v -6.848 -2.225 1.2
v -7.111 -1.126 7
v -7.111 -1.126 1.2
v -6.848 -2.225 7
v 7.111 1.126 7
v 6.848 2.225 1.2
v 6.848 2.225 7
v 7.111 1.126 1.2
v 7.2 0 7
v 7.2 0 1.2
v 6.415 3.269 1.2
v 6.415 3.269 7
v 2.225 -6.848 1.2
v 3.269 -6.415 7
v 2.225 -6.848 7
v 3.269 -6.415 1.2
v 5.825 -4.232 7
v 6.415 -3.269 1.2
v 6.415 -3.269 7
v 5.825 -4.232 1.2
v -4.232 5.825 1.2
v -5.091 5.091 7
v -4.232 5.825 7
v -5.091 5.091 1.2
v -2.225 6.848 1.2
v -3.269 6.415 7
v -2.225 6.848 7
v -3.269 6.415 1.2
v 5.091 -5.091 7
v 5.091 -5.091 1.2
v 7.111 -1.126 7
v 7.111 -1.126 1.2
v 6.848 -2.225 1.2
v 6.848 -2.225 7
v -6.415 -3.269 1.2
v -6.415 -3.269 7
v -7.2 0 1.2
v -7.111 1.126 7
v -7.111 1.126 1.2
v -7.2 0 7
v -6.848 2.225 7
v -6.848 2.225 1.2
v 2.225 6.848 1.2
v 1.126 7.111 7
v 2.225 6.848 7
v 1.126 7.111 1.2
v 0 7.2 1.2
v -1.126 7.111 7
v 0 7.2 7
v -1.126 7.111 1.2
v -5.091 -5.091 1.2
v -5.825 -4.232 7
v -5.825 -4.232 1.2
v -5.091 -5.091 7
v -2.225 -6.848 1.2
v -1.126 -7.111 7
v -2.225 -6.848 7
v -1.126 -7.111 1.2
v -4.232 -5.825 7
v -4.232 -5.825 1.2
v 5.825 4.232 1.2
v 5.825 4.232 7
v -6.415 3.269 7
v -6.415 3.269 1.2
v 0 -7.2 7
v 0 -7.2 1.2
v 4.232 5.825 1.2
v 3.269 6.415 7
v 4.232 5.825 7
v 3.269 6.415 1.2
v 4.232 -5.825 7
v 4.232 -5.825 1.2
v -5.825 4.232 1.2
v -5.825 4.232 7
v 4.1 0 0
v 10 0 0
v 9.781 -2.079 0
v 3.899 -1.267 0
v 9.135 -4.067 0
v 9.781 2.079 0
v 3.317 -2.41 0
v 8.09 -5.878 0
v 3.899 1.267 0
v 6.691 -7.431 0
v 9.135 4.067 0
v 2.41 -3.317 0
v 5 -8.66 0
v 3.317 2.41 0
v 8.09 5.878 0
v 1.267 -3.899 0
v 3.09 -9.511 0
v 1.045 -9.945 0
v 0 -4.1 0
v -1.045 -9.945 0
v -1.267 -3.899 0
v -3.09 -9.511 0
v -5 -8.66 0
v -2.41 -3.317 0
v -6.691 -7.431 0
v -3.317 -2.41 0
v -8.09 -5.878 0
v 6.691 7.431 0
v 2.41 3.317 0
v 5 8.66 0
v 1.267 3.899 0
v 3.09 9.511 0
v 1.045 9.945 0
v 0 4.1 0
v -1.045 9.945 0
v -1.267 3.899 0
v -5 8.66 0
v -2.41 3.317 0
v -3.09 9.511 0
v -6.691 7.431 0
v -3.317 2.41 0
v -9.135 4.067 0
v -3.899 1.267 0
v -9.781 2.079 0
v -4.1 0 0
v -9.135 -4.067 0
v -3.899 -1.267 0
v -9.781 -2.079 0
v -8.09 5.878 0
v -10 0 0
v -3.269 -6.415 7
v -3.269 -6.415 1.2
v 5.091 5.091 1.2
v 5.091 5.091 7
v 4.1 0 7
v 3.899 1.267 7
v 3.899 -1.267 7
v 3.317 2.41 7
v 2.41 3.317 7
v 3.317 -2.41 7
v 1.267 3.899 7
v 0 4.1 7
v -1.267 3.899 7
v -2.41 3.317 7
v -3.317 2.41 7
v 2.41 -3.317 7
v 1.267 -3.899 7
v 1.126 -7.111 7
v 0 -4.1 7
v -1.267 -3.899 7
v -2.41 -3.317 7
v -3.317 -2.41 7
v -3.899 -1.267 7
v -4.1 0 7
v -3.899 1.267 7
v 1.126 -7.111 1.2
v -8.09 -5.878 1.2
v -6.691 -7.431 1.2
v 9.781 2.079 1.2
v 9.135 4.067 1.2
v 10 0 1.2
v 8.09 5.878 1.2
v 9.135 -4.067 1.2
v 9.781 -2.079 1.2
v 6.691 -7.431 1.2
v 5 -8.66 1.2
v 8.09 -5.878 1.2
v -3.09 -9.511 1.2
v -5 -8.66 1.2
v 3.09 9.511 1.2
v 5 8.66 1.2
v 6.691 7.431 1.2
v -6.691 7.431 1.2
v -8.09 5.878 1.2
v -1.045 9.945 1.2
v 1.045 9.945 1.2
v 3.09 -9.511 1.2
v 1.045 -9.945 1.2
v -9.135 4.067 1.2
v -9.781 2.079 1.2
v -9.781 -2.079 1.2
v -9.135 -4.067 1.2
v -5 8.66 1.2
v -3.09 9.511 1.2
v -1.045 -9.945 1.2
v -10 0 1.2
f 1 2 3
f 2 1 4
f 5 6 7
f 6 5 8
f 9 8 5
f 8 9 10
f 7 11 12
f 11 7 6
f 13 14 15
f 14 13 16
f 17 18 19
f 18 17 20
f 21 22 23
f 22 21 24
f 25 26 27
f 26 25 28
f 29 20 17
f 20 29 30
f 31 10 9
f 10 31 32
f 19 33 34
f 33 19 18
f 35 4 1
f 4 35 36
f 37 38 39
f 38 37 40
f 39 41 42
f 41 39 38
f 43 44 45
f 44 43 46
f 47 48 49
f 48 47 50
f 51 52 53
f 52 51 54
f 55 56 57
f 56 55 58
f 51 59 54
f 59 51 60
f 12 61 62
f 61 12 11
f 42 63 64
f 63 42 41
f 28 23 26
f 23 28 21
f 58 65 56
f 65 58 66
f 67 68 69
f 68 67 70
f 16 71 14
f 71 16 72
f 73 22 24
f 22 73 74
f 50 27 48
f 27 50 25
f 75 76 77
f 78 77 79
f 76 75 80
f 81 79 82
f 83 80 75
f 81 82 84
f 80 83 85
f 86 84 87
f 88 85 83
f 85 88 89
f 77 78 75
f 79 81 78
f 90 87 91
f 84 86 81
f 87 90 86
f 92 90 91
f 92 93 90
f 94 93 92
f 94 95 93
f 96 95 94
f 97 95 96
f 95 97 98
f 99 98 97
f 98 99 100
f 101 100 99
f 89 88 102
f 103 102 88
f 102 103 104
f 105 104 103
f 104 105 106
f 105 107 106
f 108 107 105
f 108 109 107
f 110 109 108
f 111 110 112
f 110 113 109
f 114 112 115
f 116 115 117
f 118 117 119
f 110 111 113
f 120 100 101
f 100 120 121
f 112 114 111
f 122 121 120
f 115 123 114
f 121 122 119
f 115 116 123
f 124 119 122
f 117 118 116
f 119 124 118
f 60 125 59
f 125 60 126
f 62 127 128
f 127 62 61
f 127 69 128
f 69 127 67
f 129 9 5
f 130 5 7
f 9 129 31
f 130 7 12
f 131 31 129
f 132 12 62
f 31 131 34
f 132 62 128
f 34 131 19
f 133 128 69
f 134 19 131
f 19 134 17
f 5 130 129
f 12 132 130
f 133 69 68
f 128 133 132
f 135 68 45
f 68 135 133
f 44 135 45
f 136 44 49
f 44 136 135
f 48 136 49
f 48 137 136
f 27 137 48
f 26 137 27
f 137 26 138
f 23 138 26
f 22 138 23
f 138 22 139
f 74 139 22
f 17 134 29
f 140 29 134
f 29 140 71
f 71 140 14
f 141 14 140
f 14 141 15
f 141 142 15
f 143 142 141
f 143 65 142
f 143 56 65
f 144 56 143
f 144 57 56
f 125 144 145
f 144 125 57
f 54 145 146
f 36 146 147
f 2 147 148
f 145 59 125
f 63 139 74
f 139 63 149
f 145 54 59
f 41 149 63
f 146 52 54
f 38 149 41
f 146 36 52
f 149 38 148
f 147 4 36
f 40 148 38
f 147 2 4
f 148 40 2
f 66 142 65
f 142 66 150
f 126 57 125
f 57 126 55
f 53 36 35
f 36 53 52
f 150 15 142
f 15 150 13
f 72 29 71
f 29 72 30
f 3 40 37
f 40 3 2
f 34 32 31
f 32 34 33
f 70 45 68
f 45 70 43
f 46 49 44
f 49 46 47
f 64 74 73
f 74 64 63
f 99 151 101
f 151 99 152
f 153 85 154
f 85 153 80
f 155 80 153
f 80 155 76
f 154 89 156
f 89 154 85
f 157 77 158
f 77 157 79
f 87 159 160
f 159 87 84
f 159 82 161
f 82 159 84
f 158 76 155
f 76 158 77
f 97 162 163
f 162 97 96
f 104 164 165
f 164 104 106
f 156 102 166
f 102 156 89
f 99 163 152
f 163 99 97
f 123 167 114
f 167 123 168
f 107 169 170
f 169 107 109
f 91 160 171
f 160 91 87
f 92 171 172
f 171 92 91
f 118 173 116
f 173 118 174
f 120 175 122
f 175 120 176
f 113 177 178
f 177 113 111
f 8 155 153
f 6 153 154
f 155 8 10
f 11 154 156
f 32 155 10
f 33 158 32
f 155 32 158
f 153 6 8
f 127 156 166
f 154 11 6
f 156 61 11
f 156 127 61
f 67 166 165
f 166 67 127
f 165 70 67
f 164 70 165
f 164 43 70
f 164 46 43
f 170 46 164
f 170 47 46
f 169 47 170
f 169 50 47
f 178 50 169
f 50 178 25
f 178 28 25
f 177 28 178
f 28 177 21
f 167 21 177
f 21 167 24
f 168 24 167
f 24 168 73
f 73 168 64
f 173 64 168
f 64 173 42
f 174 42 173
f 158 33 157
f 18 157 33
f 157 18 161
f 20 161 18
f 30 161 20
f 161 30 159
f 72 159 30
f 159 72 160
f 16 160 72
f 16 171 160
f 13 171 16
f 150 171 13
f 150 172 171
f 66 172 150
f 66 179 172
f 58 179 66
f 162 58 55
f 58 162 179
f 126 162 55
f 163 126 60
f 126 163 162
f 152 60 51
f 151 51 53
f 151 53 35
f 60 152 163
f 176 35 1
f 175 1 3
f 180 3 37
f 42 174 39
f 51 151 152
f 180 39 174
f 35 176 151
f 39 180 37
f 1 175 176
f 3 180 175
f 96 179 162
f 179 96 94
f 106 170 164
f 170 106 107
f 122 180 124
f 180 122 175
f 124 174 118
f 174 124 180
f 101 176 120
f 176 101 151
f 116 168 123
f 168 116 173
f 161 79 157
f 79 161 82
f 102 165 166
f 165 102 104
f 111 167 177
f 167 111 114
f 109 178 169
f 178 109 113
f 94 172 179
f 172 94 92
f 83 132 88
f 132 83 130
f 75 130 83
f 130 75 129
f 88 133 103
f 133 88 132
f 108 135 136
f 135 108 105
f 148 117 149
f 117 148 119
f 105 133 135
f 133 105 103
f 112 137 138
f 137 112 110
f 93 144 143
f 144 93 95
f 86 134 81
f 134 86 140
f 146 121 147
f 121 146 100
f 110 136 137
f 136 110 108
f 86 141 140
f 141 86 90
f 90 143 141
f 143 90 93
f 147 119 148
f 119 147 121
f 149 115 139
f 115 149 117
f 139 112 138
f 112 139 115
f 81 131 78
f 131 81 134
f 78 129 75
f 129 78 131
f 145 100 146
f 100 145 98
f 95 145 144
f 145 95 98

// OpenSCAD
difference(){
union(){
translate(v = [0, 0, 3.5]) cylinder(h = 7, r=7.2, $fn=40, center=true);
translate(v = [0, 0, 0.6]) cylinder(h = 1.2, r=10, $fn=30, center=true);
}

translate(v = [0, 0, 5.5]) cylinder(h = 20, r=4.1, $fn=20, center=true);
}
